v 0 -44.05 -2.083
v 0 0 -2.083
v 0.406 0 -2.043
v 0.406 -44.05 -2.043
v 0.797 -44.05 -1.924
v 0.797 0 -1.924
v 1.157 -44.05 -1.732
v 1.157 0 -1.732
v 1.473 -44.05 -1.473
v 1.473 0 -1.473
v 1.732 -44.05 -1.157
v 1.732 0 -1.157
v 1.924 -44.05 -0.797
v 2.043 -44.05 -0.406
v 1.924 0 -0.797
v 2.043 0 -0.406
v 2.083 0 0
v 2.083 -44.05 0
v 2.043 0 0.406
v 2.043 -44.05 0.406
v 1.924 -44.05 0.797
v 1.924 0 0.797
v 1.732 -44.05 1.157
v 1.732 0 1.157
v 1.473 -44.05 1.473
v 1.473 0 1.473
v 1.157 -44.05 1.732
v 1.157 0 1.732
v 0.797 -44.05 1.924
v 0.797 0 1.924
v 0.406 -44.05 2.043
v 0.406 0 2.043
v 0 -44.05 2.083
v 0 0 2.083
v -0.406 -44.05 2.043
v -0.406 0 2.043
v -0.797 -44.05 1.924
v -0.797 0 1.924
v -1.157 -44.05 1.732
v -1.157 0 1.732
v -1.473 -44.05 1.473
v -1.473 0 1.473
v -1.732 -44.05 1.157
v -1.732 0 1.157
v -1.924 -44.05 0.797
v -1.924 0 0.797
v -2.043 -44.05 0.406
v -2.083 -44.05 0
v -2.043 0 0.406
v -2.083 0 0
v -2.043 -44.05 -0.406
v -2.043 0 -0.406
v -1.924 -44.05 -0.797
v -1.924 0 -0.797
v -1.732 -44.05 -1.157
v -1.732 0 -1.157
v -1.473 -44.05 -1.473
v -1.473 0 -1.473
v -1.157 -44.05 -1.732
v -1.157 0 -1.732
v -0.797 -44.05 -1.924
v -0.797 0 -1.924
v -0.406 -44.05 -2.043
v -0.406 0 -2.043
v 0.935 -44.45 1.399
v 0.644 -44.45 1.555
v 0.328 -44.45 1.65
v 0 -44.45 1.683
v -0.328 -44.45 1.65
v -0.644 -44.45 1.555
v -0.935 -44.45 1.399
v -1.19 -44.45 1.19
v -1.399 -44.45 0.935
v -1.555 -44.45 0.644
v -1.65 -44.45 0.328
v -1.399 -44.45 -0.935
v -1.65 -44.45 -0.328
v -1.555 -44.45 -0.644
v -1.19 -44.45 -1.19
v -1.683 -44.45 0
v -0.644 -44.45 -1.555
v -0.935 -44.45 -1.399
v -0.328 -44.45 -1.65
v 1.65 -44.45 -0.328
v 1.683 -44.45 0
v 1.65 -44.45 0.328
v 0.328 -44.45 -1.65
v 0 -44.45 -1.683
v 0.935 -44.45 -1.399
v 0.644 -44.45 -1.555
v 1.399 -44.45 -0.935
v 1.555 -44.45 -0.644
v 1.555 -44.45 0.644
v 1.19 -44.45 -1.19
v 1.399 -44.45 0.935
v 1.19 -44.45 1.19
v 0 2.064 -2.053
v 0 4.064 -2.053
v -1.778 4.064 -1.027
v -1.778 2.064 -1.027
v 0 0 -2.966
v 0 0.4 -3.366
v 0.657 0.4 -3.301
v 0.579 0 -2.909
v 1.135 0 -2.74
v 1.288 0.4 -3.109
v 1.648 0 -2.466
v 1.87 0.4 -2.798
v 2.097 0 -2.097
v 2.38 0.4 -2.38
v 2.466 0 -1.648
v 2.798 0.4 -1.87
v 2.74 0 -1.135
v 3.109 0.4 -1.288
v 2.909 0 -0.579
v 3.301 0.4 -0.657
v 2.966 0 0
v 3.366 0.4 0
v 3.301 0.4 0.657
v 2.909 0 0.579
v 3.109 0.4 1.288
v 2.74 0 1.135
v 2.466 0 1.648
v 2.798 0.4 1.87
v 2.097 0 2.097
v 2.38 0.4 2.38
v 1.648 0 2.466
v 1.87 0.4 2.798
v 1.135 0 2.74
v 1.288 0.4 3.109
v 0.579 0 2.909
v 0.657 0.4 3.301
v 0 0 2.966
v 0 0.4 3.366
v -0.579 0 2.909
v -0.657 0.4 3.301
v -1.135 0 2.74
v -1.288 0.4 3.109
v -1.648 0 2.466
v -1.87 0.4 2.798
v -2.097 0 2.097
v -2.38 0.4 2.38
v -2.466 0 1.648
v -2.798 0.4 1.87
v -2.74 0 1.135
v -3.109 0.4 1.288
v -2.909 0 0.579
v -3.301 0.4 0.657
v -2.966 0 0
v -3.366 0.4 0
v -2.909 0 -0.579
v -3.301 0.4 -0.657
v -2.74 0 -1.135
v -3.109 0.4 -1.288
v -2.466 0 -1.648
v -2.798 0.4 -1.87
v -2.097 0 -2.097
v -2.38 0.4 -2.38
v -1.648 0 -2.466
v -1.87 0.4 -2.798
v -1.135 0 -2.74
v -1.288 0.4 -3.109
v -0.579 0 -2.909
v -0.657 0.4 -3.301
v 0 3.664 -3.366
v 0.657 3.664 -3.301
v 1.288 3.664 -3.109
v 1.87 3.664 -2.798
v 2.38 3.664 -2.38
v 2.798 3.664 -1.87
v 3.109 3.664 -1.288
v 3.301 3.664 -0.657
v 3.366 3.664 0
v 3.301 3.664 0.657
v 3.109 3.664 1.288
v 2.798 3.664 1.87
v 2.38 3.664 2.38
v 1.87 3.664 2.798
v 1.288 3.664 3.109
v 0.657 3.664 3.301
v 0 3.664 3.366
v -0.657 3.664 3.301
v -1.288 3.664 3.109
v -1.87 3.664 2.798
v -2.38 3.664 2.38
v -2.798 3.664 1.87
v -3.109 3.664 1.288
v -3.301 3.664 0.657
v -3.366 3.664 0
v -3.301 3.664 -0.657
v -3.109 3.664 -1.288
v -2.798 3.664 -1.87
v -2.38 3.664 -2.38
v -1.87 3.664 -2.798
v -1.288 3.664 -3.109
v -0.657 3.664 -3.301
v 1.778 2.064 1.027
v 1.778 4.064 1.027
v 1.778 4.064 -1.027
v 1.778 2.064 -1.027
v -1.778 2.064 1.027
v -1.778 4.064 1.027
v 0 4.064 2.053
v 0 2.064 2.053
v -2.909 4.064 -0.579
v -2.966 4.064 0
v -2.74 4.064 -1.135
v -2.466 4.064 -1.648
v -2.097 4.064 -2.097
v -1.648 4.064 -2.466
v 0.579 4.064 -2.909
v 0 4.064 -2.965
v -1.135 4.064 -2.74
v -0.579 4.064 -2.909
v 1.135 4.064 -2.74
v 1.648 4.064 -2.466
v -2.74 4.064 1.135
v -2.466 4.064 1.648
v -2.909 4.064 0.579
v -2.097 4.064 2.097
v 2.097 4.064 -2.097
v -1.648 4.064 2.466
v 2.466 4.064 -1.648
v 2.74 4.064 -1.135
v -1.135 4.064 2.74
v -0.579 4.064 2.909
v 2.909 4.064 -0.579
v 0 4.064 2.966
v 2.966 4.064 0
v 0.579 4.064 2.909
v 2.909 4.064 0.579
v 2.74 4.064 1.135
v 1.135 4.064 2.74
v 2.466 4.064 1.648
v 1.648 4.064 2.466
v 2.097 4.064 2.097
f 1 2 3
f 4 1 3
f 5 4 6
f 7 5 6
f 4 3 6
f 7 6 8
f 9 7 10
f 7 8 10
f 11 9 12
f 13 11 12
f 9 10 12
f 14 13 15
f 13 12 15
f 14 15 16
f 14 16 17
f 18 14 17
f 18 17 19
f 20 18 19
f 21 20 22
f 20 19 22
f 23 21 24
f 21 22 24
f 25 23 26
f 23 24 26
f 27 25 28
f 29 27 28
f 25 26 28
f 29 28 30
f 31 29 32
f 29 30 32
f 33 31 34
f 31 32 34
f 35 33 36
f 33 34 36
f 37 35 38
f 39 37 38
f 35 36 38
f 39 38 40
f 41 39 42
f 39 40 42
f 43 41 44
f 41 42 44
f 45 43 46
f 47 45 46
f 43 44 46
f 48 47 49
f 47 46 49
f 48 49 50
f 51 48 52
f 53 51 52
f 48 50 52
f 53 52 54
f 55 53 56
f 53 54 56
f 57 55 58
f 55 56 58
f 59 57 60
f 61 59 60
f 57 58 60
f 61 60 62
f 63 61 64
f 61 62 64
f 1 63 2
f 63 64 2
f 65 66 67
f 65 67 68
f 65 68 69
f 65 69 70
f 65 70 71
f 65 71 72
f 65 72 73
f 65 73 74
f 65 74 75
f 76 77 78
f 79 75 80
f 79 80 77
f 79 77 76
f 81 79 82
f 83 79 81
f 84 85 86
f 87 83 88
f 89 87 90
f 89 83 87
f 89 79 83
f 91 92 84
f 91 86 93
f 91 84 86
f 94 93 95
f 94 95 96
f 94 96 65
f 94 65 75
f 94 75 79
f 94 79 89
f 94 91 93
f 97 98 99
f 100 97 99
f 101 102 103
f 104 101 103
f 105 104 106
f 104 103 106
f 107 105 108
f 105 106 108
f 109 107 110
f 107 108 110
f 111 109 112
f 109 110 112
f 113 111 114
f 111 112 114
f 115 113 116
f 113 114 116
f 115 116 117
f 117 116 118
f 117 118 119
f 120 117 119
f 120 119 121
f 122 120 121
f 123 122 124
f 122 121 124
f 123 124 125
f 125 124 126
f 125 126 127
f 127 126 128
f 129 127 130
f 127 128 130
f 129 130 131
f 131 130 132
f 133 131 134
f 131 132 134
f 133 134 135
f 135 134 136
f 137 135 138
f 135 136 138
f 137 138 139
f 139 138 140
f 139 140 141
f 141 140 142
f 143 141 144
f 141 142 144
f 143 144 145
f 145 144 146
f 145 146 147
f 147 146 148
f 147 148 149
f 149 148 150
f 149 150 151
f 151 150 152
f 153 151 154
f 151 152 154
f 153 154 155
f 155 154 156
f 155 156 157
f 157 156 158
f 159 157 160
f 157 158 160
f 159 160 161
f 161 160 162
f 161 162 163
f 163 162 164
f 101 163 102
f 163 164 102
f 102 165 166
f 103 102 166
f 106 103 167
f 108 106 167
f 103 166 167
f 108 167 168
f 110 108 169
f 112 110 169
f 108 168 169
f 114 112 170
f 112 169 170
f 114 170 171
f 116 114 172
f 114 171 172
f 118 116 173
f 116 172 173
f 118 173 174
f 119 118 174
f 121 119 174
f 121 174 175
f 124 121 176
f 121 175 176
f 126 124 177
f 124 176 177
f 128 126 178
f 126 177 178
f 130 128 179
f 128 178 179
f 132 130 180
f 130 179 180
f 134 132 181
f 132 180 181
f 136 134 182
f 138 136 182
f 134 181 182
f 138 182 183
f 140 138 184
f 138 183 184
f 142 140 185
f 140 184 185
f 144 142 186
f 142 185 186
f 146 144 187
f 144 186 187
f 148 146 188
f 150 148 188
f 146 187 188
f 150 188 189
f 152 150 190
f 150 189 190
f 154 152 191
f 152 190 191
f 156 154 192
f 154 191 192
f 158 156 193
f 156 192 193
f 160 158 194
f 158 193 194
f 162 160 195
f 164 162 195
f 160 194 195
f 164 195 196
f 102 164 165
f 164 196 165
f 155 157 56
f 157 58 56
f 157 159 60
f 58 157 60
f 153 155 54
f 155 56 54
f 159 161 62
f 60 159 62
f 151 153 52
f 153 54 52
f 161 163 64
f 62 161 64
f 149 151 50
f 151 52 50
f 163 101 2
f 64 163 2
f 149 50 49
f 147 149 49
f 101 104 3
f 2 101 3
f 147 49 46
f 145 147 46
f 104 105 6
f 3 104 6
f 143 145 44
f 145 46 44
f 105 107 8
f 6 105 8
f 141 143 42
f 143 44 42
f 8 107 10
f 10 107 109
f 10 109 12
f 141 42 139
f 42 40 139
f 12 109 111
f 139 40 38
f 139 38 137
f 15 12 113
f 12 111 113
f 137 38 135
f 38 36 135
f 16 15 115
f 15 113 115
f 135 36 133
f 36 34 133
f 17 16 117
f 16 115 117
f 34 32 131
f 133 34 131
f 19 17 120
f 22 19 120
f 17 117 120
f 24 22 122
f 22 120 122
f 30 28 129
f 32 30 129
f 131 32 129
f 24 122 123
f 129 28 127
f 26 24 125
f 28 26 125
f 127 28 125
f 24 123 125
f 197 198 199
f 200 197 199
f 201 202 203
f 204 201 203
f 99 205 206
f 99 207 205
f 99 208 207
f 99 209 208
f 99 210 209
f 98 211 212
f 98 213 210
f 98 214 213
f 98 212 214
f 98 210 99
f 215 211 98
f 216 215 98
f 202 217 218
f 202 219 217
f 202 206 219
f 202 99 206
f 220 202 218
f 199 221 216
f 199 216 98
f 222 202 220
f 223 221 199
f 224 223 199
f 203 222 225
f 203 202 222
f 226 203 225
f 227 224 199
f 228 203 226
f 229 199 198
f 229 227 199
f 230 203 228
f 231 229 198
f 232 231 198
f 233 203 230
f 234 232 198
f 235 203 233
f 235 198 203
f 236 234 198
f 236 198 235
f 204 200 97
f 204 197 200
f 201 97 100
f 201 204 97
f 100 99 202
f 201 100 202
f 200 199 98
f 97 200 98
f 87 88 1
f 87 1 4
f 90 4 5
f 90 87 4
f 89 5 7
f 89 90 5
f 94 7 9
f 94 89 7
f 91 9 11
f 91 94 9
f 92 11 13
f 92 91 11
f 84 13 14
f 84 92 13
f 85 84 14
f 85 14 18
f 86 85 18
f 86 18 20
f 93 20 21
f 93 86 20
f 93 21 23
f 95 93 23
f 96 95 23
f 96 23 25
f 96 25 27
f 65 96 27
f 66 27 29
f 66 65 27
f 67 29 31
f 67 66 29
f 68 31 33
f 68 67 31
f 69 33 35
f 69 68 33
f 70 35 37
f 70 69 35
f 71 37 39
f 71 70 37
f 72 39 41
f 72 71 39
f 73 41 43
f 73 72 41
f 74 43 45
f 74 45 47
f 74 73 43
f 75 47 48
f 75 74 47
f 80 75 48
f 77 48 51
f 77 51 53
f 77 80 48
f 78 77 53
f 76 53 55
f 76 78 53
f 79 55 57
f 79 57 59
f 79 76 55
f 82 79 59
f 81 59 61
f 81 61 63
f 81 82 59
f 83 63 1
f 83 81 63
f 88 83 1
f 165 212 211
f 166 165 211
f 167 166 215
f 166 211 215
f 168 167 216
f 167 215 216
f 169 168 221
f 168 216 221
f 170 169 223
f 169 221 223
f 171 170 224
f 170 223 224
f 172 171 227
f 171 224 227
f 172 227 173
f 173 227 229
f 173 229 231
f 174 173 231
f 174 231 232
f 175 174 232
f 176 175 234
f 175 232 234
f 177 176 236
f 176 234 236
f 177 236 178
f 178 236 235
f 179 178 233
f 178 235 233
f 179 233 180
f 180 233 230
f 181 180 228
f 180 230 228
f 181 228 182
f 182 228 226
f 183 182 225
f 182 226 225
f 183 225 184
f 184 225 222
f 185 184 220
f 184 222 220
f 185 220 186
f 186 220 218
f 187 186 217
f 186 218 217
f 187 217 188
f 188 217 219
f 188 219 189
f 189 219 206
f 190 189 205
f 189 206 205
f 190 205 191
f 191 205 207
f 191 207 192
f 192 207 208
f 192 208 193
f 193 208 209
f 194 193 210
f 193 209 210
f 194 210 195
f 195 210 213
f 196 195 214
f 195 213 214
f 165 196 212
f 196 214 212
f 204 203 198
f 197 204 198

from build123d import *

# Parameters (mm, degrees)
SKETCH1_W           = 3.3655
SKETCH1_H           = 4.064
SKETCH2_R           = 2.0828
BOSS_EXTRUDE1_DEPTH = 44.45
CUT_EXTRUDE1_DEPTH  = 2
CHAMFER1_SIZE       = 0.4


with BuildPart() as part:
    # Sketch1 → Revolve1 (revolve)
    with BuildSketch(Plane.XY, mode=Mode.PRIVATE) as revolve1_sk:
        with Locations((1.68275, 2.032)):
            Rectangle(SKETCH1_W, SKETCH1_H)
    revolve(revolve1_sk.sketch.rotate(Axis((0, 4.064, 0), (0, -1, 0)), 270), axis=Axis((0, 4.064, 0), (0, -1, 0)))

    # Sketch2 → Boss-Extrude1 (add)
    with BuildSketch(Plane.XZ):
        with Locations(Location((0, 0, 0), (0, 0, 270))):
            Circle(SKETCH2_R)
    extrude(amount=BOSS_EXTRUDE1_DEPTH)

    # Sketch3 → Cut-Extrude1 (cut)
    with BuildSketch(Plane(origin=(0, 4.064, 0), x_dir=(-1, 0, 0), z_dir=(0, 1, 0))):
        Polygon((-1.778, -1.026528779), (0, -2.053057557), (1.778, -1.026528779), (1.778, 1.026528779), (0, 2.053057557), (-1.778, 1.026528779), align=None)
    extrude(amount=-CUT_EXTRUDE1_DEPTH, mode=Mode.SUBTRACT)

    # Chamfer1
    chamfer1_edges = [part.edges().sort_by_distance(p)[0] for p in [
        (0, 0, 3.3655),
        (0, 4.064, 3.3655),
        (0, -44.45, 2.0828),
    ]]
    chamfer(chamfer1_edges, length=CHAMFER1_SIZE)


solid = part.part
